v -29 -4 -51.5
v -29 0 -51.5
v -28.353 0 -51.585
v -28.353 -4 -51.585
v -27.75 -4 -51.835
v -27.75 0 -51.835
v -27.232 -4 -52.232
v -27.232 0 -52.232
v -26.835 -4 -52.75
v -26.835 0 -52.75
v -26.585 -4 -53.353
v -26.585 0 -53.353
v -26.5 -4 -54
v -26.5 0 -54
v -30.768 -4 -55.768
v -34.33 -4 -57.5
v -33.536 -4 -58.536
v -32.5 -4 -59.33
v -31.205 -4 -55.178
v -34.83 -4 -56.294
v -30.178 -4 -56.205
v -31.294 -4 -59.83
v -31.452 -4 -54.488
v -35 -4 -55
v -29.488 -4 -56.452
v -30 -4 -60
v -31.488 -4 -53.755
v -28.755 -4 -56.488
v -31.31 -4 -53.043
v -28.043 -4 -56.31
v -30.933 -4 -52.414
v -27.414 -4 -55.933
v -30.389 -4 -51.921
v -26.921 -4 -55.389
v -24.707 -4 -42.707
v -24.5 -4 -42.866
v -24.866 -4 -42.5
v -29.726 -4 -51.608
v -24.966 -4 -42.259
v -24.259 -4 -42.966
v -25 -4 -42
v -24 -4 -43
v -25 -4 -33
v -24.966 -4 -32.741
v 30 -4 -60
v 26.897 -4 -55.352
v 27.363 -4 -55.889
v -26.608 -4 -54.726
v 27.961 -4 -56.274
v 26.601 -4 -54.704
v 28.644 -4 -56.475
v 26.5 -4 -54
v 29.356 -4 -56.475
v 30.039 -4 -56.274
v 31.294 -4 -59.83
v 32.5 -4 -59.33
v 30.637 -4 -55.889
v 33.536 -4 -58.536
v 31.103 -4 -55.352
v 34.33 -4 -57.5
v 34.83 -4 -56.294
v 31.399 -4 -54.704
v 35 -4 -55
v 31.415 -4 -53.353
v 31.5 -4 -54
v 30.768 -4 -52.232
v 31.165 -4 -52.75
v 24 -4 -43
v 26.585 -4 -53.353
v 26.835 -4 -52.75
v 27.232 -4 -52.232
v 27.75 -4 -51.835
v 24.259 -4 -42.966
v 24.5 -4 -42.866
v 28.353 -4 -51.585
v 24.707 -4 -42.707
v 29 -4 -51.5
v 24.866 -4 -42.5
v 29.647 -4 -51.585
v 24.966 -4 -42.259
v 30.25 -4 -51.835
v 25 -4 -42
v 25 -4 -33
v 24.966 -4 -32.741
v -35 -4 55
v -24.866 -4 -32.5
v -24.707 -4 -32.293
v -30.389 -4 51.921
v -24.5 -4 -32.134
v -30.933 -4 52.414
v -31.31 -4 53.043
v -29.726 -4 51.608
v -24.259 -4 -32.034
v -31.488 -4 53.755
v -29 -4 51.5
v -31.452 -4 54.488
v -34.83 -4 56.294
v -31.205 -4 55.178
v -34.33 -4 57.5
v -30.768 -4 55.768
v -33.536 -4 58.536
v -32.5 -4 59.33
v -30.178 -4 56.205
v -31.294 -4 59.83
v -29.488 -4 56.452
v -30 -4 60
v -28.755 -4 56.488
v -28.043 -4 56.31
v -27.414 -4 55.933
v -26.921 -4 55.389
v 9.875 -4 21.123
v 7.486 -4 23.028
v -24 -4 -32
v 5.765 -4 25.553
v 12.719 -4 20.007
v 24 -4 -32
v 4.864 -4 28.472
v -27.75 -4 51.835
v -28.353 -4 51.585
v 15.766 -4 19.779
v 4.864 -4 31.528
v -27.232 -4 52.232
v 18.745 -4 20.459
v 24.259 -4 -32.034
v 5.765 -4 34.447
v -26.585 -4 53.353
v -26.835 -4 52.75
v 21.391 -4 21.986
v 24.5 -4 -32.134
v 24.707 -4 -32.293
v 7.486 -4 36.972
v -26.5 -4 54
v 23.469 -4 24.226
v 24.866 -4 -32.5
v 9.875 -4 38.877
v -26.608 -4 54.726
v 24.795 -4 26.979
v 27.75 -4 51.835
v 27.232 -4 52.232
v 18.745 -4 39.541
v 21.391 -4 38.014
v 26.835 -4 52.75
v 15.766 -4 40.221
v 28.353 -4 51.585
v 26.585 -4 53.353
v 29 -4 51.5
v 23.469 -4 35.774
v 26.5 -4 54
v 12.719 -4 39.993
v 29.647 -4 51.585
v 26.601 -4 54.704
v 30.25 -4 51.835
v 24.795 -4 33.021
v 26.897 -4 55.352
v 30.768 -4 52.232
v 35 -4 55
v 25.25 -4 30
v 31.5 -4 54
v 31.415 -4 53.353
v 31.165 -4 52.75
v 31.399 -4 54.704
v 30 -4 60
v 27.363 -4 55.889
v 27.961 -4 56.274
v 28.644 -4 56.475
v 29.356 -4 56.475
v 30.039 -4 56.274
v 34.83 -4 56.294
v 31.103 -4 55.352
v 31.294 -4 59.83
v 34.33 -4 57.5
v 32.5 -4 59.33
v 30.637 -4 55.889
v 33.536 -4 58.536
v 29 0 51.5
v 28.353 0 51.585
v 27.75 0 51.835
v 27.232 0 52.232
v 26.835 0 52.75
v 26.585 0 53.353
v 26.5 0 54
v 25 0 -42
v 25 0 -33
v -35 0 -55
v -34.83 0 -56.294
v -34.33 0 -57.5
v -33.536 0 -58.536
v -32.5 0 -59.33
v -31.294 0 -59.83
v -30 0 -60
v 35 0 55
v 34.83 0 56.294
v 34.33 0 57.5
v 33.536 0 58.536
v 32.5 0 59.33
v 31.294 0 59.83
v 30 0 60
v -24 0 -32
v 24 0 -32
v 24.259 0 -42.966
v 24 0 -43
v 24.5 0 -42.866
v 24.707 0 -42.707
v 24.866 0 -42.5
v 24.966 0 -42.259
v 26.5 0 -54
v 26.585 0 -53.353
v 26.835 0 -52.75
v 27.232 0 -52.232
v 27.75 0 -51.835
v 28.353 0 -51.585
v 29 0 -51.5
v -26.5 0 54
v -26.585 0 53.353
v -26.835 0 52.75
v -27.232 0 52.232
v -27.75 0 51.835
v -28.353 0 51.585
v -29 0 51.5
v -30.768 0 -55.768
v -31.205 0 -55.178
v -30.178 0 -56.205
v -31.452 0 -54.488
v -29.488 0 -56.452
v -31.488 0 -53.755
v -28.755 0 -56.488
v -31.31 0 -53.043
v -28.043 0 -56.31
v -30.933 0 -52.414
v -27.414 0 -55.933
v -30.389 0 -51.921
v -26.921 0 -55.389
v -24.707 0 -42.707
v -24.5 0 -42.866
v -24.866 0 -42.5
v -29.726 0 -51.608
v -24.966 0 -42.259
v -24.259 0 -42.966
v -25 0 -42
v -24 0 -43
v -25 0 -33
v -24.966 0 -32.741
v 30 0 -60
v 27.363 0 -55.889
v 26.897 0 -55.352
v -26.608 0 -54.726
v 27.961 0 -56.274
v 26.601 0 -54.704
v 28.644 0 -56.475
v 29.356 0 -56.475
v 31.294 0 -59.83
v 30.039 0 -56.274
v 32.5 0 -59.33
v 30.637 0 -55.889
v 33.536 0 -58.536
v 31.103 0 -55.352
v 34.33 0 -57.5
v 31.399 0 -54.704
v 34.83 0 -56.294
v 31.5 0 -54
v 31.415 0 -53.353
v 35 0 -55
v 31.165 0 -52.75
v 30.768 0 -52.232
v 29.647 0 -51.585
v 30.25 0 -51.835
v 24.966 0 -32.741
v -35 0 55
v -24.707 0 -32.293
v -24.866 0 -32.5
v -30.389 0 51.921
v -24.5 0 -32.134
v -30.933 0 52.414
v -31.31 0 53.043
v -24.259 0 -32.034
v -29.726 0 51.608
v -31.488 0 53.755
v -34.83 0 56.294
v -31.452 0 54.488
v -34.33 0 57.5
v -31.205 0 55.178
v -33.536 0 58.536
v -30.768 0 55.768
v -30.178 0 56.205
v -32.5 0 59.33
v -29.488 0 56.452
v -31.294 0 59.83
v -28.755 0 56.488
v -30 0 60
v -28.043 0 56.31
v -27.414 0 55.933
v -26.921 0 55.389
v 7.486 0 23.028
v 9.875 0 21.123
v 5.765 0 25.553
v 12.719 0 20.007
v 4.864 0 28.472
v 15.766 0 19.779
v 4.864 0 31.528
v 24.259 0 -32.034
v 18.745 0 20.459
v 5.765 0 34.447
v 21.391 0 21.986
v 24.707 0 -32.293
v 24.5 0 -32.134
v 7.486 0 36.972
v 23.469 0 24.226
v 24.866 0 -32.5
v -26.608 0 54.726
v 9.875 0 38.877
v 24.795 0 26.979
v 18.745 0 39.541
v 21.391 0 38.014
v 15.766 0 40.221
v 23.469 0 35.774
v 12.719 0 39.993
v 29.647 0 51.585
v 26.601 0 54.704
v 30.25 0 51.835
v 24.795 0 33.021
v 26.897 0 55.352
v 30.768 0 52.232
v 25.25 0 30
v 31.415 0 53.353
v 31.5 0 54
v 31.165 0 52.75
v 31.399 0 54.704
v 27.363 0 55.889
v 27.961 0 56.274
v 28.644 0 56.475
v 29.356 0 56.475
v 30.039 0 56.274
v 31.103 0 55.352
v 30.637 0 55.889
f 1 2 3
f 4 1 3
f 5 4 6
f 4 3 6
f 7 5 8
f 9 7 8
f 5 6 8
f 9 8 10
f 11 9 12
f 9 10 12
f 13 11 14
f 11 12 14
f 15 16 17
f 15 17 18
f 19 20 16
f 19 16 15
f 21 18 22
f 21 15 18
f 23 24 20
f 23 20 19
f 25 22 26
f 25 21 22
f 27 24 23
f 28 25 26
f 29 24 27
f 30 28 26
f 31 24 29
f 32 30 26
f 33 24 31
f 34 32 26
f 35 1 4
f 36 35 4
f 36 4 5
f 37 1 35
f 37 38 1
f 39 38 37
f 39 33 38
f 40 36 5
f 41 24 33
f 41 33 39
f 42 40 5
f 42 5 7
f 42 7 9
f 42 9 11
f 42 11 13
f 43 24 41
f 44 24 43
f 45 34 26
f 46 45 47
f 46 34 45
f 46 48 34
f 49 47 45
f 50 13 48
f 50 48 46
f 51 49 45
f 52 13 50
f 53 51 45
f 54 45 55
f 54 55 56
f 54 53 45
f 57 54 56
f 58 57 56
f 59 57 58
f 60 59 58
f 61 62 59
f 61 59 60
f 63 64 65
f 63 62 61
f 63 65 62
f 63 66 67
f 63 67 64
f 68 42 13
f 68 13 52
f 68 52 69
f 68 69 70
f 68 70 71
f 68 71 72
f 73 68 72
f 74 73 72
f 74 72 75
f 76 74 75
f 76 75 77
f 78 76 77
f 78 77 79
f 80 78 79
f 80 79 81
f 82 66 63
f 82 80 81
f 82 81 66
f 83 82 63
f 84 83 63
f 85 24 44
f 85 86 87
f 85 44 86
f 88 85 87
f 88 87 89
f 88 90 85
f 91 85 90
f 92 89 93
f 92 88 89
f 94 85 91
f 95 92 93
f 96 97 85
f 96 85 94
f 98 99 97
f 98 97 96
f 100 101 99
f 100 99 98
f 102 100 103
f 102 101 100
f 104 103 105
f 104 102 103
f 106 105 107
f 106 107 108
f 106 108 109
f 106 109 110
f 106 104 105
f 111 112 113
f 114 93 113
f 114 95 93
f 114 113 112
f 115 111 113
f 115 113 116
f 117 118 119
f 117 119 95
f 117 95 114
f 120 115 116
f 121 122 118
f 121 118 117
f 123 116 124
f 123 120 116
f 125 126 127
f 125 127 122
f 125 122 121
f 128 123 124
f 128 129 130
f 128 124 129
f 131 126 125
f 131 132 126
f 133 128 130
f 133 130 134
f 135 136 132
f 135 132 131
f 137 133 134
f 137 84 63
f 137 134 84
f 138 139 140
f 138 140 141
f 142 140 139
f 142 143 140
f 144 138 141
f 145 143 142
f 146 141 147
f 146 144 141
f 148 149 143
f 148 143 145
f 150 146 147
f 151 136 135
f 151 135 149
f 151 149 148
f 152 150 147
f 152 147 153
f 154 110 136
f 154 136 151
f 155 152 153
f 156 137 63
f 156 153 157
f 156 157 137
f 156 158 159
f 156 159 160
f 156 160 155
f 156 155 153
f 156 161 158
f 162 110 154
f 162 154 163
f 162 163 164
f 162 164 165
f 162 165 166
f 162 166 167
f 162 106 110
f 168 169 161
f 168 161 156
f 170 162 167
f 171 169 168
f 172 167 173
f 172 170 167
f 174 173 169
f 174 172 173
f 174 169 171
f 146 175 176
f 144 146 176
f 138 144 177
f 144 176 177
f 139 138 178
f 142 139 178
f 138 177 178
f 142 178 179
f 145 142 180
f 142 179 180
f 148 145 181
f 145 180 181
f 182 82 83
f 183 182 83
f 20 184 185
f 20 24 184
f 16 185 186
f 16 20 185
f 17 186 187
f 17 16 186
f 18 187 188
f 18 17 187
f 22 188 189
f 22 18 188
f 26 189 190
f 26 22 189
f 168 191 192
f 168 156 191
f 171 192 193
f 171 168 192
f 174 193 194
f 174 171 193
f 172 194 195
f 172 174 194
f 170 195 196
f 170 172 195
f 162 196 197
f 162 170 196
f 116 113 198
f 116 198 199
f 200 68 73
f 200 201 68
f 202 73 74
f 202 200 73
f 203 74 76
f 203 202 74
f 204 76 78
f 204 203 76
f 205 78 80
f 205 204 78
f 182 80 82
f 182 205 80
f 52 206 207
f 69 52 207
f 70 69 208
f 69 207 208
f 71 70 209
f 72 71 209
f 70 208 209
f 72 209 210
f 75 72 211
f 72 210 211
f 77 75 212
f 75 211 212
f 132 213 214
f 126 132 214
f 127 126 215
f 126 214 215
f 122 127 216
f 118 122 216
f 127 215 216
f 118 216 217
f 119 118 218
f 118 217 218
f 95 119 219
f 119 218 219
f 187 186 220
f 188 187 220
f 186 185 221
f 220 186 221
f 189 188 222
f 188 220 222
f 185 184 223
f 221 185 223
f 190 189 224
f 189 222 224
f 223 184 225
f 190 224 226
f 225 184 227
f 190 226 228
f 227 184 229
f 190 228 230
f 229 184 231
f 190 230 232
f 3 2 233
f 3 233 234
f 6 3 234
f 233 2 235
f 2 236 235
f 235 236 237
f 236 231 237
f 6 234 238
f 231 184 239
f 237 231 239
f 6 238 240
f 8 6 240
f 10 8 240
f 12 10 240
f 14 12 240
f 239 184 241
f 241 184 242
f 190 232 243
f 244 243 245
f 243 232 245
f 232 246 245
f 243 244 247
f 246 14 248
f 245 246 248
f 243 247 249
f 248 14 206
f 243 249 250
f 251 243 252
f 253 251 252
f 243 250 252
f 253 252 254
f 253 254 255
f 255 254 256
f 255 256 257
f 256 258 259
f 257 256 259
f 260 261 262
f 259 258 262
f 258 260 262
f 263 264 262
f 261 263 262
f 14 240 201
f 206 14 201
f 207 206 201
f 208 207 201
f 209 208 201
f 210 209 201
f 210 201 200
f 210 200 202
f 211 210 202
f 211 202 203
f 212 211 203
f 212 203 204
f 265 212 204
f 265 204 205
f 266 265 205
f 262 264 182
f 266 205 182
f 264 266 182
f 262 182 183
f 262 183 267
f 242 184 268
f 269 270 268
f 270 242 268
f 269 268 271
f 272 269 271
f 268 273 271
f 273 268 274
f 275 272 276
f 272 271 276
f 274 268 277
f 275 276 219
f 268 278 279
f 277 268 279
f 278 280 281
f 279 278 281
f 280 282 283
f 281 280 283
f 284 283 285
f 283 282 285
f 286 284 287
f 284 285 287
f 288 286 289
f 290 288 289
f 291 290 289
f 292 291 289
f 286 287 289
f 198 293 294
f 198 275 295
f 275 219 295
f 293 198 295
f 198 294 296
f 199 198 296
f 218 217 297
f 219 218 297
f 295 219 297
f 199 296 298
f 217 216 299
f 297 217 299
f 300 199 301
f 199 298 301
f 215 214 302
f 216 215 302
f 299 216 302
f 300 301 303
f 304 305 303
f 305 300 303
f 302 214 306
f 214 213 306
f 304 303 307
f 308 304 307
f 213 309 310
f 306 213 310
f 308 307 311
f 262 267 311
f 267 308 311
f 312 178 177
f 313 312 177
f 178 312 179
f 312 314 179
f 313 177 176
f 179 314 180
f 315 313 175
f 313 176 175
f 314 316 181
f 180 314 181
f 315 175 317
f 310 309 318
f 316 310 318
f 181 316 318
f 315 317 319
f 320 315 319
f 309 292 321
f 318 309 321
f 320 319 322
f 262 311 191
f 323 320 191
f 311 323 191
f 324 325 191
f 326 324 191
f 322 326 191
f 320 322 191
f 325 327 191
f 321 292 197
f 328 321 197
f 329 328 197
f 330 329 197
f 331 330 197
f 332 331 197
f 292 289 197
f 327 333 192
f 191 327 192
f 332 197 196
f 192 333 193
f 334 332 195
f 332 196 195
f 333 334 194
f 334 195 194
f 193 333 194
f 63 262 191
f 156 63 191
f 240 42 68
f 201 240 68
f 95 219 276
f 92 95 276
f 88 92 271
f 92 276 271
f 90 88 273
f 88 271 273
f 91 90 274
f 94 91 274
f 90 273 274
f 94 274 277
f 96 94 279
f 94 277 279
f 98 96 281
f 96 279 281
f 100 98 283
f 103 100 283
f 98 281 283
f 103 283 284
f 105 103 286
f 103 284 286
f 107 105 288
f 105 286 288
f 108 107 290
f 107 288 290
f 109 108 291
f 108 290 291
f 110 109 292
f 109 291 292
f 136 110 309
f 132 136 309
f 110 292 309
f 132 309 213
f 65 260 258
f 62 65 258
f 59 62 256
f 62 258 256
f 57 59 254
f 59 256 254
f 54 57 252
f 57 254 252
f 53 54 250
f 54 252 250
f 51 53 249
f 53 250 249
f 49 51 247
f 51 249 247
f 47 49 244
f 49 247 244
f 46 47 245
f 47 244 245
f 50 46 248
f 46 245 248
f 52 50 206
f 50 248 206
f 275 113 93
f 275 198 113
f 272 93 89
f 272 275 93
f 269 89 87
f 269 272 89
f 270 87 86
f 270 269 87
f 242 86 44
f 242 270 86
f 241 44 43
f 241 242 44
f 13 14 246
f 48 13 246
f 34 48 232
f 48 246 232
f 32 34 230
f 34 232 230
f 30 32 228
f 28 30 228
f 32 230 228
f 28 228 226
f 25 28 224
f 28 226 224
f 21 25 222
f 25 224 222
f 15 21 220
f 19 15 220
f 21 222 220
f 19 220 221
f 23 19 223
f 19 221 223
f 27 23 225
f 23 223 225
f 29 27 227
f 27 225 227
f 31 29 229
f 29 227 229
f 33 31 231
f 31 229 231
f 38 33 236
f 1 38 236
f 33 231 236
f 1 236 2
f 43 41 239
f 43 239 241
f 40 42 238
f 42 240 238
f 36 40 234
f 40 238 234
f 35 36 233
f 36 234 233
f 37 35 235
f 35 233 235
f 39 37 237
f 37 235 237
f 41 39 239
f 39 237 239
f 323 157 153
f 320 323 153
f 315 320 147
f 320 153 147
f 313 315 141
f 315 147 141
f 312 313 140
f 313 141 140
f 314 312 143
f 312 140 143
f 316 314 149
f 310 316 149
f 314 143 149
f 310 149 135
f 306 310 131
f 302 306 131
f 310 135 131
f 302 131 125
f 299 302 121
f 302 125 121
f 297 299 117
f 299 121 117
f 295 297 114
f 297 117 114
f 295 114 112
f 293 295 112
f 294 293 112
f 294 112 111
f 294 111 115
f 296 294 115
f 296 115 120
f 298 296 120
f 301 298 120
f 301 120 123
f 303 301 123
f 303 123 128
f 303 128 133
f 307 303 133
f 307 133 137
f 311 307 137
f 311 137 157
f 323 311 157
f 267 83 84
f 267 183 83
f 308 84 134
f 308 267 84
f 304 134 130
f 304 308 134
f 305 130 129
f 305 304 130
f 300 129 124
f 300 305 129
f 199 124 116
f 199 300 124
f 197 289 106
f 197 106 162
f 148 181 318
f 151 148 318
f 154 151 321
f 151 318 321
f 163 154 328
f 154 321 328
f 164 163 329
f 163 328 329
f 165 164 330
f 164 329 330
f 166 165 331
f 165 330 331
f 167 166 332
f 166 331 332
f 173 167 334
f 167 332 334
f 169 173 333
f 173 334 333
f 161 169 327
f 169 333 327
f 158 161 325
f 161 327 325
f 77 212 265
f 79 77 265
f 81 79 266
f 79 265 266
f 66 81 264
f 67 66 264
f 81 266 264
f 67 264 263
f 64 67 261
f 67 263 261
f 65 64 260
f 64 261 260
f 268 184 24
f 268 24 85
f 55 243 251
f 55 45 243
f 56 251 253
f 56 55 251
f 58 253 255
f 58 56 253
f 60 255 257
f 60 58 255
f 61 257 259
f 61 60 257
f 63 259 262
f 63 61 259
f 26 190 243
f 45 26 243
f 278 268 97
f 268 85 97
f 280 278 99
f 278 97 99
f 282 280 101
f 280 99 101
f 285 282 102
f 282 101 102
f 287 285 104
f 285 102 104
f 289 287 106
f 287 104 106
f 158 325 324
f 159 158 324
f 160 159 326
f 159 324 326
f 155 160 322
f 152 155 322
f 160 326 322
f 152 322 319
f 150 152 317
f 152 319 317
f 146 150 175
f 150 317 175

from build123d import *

# Parameters (mm, degrees)
F0_W     = 70
F0_H     = 120
F1_DEPTH = 4
F2_R     = 5
F3_R     = 10.25
F4_DEPTH = 25
F5_W     = 50
F5_H     = 11
F6_DEPTH = 25
F7_R     = 1


with BuildPart() as f1:
    # F0 (on Front) → F1 (new body)
    with BuildSketch(Plane.XZ):
        Rectangle(F0_W, F0_H)
        with BuildLine():
            ThreePointArc((-29, 51.5), (-30.767766953, 55.767766953), (-26.5, 54))
            Line((-26.5, 54), (26.5, 54))
            ThreePointArc((26.5, 54), (29, 56.5), (31.5, 54))
            ThreePointArc((31.5, 54), (30.767766953, 52.232233047), (29, 51.5))
            Line((29, 51.5), (29, -51.5))
            ThreePointArc((29, -51.5), (30.767766953, -52.232233047), (31.5, -54))
            ThreePointArc((31.5, -54), (29, -56.5), (26.5, -54))
            Line((26.5, -54), (-26.5, -54))
            ThreePointArc((-26.5, -54), (-30.767766953, -55.767766953), (-29, -51.5))
            Line((-29, -51.5), (-29, 51.5))
        make_face(mode=Mode.SUBTRACT)
        with BuildLine():
            Line((26.5, 54), (-26.5, 54))
            ThreePointArc((-26.5, 54), (-27.232233047, 52.232233047), (-29, 51.5))
            Line((-29, 51.5), (-29, -51.5))
            ThreePointArc((-29, -51.5), (-27.232233047, -52.232233047), (-26.5, -54))
            Line((-26.5, -54), (26.5, -54))
            ThreePointArc((26.5, -54), (27.232233047, -52.232233047), (29, -51.5))
            Line((29, -51.5), (29, 51.5))
            ThreePointArc((29, 51.5), (27.232233047, 52.232233047), (26.5, 54))
        make_face()
    extrude(amount=F1_DEPTH)

    # F2
    f2_edges = [f1.edges().sort_by_distance(p)[0] for p in [
        (-35, -2, 60),
        (35, -2, 60),
        (-35, -2, -60),
        (35, -2, -60),
    ]]
    fillet(f2_edges, radius=F2_R)

    # F3 (on face) → F4 (cut)
    with BuildSketch(Plane.XZ.offset(4)):
        with Locations((15, 30)):
            Circle(F3_R)
    extrude(amount=-F4_DEPTH, mode=Mode.SUBTRACT)

    # F5 (on face) → F6 (cut)
    with BuildSketch(Plane.XZ.offset(4)):
        with Locations((0, -37.5)):
            Rectangle(F5_W, F5_H)
    extrude(amount=-F6_DEPTH, mode=Mode.SUBTRACT)

    # F7
    f7_edges = [f1.edges().sort_by_distance(p)[0] for p in [
        (-25, -2, -43),
        (-25, -2, -32),
        (25, -2, -32),
        (25, -2, -43),
    ]]
    fillet(f7_edges, radius=F7_R)


solid = f1.part
